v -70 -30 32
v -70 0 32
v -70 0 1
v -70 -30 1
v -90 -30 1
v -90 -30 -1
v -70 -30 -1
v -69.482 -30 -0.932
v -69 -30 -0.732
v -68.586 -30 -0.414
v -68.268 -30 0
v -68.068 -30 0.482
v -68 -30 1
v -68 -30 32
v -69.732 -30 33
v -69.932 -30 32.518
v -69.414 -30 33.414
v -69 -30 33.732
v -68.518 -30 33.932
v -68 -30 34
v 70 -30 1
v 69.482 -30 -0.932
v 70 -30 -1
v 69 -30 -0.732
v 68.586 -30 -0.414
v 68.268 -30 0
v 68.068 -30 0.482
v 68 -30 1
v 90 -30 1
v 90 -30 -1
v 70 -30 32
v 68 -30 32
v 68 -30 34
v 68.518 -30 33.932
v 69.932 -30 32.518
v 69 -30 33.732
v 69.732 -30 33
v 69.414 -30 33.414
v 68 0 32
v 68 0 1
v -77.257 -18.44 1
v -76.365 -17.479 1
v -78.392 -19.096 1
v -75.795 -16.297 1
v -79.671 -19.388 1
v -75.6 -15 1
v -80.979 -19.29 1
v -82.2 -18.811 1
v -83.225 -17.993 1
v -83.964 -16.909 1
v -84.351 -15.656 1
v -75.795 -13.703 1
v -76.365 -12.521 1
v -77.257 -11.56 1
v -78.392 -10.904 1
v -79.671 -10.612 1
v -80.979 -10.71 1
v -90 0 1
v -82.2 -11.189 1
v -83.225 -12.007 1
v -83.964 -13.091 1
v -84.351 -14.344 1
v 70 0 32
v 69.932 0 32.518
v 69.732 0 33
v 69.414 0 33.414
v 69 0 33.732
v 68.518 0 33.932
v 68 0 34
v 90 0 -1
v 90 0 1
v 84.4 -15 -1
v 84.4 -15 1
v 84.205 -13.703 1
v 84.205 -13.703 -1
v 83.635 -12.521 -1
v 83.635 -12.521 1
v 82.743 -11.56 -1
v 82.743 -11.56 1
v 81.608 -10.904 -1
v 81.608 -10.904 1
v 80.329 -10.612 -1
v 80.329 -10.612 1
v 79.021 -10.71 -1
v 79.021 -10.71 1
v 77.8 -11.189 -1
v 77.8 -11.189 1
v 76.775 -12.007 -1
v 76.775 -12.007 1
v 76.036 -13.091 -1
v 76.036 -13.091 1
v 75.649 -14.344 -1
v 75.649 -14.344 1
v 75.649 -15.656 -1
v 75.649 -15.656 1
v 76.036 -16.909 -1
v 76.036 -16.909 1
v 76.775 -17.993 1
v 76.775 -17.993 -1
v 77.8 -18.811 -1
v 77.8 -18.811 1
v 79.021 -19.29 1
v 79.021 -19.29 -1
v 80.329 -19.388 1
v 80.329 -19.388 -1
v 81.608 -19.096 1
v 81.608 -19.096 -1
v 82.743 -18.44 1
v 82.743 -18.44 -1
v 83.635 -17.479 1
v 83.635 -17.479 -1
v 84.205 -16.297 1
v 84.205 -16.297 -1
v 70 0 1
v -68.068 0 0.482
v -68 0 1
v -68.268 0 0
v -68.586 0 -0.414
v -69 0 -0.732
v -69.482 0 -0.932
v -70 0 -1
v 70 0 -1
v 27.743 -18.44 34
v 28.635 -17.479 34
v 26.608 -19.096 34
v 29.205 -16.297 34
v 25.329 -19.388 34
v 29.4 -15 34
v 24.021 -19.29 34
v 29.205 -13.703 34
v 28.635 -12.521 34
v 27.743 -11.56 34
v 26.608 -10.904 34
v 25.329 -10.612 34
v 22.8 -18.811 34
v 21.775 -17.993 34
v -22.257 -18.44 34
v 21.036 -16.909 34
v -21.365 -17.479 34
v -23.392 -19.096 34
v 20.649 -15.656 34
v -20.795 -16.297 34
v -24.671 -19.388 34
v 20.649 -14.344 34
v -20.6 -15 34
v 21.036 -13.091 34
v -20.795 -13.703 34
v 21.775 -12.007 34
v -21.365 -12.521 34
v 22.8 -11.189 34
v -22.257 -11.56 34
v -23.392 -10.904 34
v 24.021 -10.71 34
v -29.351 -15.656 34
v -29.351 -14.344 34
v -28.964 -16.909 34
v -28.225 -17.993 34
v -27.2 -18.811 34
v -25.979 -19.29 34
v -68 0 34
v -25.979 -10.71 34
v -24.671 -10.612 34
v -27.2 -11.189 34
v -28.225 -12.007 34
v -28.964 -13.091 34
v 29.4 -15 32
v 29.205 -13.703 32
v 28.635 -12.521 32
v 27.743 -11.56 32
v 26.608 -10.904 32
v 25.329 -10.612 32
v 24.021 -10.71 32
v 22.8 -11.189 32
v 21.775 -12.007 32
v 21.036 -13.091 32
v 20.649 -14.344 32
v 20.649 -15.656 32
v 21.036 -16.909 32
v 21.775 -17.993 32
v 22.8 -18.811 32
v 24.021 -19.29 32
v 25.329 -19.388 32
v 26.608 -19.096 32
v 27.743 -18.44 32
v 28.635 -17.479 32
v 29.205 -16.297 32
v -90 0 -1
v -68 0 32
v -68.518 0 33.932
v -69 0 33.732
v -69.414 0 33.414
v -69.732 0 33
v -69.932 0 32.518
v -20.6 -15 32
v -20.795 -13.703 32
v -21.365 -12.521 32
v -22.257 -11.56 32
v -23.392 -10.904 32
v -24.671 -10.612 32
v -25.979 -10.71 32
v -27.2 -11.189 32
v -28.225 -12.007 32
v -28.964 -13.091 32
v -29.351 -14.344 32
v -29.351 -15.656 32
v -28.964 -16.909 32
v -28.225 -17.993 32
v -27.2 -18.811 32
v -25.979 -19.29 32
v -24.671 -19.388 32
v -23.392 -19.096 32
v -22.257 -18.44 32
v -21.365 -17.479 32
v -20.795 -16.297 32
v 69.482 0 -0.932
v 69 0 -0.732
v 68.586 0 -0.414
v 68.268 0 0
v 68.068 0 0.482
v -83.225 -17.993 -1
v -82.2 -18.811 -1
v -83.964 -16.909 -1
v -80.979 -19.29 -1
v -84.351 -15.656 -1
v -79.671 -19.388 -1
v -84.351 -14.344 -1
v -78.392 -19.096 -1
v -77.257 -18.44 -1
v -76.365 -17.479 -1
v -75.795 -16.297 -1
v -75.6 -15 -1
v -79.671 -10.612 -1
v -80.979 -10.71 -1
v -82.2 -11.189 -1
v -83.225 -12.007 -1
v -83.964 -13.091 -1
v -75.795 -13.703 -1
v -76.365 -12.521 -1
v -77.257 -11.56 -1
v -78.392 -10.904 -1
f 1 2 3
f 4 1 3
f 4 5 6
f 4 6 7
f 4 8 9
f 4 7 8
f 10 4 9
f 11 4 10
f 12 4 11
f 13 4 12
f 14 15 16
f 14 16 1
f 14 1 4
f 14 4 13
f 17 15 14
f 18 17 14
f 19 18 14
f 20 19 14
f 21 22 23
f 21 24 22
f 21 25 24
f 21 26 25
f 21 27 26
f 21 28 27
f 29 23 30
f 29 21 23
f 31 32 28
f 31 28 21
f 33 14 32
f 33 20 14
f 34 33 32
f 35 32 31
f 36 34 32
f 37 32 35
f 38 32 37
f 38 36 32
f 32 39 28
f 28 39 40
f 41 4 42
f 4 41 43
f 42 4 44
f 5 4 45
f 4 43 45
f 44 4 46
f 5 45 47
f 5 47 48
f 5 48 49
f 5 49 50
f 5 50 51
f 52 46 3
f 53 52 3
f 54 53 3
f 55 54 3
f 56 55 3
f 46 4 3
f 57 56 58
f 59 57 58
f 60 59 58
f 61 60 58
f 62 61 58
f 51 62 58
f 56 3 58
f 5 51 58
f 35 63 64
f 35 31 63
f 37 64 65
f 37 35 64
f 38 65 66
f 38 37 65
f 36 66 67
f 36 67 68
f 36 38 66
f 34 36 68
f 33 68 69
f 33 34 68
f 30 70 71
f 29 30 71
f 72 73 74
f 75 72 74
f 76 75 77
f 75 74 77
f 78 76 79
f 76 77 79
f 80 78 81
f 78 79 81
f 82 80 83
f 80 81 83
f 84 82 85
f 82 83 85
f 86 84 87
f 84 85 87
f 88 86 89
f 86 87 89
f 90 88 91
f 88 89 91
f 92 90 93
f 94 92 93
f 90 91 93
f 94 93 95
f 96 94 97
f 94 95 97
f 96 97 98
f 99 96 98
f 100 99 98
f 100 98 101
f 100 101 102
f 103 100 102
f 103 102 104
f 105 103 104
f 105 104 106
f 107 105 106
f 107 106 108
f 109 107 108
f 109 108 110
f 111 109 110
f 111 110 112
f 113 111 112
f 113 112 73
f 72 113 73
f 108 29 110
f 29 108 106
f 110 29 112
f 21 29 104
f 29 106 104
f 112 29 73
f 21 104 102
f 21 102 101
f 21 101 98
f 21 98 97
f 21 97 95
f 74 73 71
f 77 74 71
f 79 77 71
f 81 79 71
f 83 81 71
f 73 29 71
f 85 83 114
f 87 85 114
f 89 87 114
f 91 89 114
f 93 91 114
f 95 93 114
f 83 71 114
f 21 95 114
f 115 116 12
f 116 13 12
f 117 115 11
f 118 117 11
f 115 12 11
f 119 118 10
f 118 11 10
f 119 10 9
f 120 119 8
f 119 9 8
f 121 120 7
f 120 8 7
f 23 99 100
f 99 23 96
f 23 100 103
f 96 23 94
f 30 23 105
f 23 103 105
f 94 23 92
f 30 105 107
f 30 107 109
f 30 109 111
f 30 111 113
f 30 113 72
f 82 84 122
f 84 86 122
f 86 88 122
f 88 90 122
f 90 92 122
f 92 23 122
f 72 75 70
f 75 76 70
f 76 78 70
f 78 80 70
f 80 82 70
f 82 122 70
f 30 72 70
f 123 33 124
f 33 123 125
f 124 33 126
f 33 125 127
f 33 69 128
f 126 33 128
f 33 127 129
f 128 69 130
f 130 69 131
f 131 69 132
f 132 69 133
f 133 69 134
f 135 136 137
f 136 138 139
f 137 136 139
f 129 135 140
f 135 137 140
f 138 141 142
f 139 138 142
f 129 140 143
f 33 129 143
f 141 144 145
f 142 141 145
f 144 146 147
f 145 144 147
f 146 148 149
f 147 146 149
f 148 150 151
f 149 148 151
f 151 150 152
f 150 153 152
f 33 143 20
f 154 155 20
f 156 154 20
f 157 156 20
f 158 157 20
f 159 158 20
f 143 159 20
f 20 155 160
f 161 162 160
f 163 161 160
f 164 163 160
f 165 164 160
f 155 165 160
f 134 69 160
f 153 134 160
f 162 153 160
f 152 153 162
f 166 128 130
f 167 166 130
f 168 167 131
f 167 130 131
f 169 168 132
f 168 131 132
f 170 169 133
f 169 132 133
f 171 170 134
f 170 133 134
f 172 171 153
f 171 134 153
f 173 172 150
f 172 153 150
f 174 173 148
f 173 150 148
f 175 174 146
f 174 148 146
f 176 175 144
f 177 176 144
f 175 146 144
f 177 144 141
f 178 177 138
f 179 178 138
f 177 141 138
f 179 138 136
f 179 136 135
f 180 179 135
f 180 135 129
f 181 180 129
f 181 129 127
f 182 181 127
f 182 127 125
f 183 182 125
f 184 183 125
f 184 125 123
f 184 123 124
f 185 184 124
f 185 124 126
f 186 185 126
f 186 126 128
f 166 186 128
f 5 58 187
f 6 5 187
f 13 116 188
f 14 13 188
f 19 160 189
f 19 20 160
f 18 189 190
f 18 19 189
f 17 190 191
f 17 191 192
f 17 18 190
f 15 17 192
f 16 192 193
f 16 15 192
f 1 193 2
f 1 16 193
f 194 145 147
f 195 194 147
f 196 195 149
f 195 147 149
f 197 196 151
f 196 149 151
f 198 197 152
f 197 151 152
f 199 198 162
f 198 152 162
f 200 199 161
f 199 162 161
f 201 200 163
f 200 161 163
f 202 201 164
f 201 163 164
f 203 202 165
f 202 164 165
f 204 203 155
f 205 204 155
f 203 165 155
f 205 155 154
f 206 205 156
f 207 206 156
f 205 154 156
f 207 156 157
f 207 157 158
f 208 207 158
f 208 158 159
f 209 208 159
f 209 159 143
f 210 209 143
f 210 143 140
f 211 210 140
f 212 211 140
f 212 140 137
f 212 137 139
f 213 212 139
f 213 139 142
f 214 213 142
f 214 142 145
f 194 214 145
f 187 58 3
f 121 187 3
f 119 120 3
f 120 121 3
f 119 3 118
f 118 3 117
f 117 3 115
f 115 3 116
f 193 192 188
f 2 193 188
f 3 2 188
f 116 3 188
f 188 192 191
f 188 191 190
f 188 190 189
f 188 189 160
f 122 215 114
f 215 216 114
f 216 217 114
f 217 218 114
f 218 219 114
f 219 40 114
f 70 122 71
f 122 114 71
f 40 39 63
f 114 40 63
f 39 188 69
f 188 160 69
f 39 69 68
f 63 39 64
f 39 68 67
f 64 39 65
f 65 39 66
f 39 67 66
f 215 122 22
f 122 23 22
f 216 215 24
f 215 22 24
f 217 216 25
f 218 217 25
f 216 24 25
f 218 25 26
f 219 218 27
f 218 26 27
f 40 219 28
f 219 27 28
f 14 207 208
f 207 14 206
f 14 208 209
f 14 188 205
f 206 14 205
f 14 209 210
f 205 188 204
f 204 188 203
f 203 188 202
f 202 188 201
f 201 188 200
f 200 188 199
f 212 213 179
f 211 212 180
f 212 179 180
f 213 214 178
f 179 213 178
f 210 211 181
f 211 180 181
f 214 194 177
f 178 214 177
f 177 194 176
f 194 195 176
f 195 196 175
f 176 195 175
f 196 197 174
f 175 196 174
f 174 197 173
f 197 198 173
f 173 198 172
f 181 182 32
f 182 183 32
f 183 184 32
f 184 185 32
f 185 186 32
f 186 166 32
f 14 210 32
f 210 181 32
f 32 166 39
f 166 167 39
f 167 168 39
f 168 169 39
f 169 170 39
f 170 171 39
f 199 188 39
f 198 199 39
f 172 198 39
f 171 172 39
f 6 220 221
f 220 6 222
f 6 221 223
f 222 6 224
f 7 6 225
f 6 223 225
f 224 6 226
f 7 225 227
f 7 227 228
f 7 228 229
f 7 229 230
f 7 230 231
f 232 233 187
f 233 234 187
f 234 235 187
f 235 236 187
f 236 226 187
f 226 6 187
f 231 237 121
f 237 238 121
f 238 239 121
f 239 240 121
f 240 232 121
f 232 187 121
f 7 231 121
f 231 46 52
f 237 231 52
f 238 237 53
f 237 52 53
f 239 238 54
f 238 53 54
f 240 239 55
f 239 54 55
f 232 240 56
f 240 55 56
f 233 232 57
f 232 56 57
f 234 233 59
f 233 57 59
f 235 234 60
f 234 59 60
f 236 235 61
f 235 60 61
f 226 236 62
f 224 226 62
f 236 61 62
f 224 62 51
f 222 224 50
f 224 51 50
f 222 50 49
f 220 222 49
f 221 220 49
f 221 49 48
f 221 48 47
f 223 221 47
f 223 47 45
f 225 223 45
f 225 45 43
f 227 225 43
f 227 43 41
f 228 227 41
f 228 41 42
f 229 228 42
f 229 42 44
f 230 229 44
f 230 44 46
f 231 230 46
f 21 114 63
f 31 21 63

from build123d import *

# Parameters (mm, degrees)
F1_DEPTH = 30
F2_R     = 4.4
F3_R     = 4.4
F4_DEPTH = 25
F5_R     = 2
F6_R     = 2


# Not quite as in the source:
# - a feature names something its author has since deleted; it is built from what else it names


with BuildPart() as f1:
    # F0 (on Front) → F1 (new body)
    with BuildSketch(Plane.XZ):
        Polygon((90, -1), (90, 1), (70, 1), (70, 34), (-70, 34), (-70, 1), (-90, 1), (-90, -1), (-68, -1), (-68, 32), (68, 32), (68, -1), align=None)
    extrude(amount=F1_DEPTH)

    # F2 (on face) + F3 (on face) → F4 (cut)
    with BuildSketch(Plane.XY.offset(1)):
        with Locations((-80, -15)):
            Circle(F2_R)
        with Locations((80, -15)):
            Circle(F2_R)
    with BuildSketch(Plane.XY.offset(34)):
        with Locations((-25, -15)):
            Circle(F3_R)
        with Locations((25, -15)):
            Circle(F3_R)
    extrude(amount=-F4_DEPTH, mode=Mode.SUBTRACT)

    # F5
    f5_edges = [f1.edges().sort_by_distance(p)[0] for p in [
        (-70, -15, 34),
        (70, -15, 34),
    ]]
    fillet(f5_edges, radius=F5_R)

    # F6
    f6_edges = [f1.edges().sort_by_distance(p)[0] for p in [
        (68, -15, -1),
        (-68, -15, -1),
    ]]
    fillet(f6_edges, radius=F6_R)


solid = f1.part
